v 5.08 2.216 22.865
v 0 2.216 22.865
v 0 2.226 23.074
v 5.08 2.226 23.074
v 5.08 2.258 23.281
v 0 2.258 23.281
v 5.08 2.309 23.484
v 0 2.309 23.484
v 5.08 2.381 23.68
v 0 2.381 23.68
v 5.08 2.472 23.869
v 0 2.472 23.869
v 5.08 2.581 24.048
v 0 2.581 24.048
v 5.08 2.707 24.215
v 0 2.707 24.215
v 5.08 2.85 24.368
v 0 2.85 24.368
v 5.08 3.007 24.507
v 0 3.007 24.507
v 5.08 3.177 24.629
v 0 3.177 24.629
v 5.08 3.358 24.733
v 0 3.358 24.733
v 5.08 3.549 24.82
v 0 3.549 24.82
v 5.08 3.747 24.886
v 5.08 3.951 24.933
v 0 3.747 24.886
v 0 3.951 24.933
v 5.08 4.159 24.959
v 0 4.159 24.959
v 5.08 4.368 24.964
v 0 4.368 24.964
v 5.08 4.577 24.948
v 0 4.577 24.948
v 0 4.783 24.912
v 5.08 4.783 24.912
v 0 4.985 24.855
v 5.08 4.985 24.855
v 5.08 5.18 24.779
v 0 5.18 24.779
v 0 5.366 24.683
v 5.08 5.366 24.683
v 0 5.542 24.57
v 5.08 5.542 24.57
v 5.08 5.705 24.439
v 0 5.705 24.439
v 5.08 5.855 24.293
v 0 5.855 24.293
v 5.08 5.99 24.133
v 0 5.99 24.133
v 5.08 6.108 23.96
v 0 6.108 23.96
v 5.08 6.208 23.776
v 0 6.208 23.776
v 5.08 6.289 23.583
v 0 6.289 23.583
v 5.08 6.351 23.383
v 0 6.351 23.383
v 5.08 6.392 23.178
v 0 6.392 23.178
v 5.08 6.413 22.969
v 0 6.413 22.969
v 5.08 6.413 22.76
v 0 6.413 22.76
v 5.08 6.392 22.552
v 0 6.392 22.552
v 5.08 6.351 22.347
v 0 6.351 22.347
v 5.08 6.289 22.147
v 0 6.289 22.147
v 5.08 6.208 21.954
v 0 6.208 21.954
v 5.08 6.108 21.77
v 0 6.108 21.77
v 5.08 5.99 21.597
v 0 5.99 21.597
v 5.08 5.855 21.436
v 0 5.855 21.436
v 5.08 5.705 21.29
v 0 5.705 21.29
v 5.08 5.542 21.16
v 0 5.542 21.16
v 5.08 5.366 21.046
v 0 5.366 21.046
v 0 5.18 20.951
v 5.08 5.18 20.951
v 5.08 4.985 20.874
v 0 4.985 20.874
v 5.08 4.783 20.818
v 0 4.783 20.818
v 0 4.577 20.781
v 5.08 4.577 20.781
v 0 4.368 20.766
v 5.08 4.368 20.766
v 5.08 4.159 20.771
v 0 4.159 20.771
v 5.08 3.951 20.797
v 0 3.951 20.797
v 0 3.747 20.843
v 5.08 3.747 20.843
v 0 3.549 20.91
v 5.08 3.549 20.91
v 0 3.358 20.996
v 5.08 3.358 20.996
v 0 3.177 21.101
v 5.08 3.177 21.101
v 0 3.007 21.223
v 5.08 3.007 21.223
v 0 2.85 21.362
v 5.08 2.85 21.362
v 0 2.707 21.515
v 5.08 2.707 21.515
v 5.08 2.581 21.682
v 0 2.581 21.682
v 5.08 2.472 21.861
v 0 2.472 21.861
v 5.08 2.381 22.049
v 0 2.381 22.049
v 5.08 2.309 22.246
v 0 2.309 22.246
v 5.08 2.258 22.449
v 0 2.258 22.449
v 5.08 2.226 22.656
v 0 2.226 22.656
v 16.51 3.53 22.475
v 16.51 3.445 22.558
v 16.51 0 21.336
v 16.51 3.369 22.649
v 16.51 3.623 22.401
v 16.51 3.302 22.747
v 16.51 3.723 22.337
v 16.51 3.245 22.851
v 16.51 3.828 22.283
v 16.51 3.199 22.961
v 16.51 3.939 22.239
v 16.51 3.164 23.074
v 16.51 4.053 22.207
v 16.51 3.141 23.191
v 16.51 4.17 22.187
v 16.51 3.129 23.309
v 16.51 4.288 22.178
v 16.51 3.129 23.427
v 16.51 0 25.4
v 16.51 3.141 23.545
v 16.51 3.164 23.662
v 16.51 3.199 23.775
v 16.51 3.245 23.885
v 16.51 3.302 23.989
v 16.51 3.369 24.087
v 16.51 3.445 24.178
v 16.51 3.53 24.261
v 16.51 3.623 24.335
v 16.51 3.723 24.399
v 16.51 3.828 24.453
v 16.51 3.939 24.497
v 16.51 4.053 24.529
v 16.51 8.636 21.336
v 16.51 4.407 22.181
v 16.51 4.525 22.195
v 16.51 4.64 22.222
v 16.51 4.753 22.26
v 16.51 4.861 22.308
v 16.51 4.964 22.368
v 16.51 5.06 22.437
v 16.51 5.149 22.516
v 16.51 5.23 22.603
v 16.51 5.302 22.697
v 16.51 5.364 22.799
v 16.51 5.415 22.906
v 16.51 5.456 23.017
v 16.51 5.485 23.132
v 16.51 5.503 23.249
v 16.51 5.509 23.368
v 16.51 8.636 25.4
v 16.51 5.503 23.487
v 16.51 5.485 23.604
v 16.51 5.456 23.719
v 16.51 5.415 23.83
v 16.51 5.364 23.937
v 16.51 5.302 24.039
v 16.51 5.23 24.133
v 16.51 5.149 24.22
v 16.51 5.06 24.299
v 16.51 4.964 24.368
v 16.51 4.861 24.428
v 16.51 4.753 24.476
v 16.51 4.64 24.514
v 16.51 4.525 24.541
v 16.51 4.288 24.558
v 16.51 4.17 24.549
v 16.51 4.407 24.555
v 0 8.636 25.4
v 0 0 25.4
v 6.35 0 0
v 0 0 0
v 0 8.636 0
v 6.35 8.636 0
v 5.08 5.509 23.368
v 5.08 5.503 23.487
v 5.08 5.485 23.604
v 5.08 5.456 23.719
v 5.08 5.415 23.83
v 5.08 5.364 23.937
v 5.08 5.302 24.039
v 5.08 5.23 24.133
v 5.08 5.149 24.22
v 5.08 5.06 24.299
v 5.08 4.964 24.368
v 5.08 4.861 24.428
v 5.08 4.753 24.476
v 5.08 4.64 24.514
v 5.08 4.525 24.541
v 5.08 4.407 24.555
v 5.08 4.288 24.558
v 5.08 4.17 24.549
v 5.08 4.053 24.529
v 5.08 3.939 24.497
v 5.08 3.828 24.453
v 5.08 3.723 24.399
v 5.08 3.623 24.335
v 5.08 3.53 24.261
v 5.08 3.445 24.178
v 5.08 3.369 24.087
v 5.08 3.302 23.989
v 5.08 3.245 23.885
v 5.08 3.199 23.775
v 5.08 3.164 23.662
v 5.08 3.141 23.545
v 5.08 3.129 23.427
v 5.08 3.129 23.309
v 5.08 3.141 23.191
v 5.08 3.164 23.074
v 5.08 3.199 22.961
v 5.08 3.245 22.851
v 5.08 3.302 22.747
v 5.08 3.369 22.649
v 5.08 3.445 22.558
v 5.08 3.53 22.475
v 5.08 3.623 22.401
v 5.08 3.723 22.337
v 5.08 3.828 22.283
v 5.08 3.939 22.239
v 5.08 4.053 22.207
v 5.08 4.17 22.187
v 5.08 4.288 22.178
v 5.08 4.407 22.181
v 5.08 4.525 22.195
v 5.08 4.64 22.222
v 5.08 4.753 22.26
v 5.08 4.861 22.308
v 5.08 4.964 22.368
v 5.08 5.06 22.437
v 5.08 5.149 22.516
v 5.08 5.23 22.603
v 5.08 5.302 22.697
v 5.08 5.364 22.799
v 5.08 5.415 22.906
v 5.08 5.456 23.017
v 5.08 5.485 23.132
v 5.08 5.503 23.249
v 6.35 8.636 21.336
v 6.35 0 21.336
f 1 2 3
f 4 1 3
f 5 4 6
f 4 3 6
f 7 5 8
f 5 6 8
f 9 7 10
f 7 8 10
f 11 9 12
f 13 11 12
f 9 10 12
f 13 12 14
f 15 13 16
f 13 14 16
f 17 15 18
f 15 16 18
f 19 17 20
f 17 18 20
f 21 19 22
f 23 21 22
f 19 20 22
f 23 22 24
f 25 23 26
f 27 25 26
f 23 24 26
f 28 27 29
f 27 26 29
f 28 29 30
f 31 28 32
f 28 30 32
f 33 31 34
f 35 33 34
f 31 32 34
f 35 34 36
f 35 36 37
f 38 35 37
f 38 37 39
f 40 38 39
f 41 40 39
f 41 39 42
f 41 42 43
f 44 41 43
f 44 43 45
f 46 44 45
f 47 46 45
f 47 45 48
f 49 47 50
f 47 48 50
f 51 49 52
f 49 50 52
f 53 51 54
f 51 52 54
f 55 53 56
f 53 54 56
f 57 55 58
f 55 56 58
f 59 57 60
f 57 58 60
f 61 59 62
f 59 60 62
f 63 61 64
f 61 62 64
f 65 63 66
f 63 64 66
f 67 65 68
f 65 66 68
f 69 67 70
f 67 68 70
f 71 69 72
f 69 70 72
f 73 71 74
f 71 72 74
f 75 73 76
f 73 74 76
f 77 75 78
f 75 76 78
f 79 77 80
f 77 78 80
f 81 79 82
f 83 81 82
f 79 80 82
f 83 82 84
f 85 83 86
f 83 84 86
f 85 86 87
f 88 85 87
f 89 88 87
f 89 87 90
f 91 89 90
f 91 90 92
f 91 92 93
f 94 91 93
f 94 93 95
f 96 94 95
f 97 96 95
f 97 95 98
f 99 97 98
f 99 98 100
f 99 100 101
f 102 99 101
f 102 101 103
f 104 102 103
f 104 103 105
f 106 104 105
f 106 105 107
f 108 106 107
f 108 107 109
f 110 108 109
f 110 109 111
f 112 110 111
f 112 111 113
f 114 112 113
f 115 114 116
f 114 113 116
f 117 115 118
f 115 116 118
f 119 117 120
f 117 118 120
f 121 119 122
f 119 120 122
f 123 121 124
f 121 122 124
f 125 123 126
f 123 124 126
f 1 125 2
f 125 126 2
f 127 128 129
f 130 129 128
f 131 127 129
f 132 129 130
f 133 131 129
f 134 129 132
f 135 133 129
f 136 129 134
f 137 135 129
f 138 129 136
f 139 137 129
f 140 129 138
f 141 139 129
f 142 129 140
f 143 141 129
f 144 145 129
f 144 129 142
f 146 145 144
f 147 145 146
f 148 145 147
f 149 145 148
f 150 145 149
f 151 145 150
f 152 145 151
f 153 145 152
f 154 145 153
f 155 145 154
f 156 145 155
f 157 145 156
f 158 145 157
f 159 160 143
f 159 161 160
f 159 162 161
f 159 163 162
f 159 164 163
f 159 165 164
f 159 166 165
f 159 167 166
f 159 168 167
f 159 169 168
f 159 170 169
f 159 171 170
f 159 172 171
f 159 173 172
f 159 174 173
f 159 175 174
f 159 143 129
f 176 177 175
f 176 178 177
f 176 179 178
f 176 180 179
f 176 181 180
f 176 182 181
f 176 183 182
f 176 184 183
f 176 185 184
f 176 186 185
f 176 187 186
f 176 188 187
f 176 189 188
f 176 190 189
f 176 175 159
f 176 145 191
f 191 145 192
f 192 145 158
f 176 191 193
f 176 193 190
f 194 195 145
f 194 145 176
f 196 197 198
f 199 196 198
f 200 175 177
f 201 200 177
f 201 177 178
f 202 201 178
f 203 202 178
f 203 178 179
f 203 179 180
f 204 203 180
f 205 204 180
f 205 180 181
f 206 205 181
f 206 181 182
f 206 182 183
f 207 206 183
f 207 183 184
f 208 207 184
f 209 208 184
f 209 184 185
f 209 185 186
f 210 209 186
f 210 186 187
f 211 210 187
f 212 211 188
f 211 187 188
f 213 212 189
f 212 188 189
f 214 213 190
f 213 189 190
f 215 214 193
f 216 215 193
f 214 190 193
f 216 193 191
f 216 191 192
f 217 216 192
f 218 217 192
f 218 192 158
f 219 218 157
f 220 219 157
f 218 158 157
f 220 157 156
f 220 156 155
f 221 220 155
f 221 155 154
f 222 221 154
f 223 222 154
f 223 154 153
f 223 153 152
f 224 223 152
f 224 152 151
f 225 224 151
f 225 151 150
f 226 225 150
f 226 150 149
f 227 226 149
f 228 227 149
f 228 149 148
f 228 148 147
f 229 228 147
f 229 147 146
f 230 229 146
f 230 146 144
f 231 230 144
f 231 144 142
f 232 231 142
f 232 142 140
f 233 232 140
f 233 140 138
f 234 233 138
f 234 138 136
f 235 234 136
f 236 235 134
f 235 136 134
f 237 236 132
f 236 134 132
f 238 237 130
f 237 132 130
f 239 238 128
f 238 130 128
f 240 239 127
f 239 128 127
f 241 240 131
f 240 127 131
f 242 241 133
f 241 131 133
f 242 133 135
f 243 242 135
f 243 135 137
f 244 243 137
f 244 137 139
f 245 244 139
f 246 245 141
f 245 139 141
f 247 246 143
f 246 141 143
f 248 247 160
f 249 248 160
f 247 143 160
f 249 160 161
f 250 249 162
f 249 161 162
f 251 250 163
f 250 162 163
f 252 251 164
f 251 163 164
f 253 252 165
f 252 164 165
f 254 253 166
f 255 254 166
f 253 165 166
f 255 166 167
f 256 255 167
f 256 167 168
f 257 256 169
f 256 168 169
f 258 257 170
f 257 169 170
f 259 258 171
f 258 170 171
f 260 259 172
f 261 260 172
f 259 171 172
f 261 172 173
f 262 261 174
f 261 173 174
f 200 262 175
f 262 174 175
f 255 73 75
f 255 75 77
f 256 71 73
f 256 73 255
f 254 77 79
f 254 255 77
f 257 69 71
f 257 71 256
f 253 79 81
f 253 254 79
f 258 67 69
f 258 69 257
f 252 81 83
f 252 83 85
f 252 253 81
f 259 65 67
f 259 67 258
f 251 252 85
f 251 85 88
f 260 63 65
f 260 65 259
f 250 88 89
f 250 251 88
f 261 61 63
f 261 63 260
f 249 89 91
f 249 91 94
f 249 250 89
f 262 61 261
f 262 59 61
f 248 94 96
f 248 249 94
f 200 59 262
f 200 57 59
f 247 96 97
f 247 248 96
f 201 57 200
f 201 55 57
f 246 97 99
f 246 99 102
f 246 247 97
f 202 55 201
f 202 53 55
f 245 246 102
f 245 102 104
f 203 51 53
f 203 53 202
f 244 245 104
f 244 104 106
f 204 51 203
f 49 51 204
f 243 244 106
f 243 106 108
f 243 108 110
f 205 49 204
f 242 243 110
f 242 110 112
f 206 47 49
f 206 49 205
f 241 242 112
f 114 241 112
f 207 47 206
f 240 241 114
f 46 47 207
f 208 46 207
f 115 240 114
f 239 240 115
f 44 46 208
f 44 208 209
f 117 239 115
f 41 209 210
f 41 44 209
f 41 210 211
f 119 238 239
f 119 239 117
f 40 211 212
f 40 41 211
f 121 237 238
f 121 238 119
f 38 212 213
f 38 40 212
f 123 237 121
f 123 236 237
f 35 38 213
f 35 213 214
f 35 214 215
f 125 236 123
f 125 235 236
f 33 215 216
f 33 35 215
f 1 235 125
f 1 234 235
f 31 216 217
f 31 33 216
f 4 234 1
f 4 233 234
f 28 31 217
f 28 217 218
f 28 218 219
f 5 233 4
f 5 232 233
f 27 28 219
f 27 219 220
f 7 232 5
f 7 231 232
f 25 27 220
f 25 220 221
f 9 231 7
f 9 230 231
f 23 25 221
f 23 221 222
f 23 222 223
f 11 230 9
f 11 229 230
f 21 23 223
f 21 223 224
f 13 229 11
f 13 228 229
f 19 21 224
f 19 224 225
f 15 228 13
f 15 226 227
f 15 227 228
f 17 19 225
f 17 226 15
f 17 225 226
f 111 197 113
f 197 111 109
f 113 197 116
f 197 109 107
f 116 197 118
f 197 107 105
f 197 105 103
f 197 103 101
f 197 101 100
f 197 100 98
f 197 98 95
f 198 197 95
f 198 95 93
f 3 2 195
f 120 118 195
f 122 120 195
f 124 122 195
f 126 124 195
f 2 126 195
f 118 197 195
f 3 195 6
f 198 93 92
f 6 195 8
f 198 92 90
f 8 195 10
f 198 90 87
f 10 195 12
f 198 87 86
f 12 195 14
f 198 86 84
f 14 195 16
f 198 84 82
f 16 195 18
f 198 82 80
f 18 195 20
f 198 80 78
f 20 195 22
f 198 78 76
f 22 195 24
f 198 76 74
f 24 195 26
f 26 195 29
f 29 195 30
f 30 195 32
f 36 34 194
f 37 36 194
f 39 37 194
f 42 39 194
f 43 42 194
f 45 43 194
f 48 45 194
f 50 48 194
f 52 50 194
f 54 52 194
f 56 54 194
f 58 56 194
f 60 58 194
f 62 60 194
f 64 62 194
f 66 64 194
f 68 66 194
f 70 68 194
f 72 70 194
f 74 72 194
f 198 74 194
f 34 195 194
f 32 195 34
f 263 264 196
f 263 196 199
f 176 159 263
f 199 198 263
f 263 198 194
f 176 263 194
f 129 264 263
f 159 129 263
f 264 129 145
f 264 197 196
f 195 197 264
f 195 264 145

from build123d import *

# Parameters (mm, degrees)
F0_W     = 8.636
F0_H     = 25.4
F1_DEPTH = 6.35
F2_W     = 8.636
F2_H     = 4.064
F3_DEPTH = 10.16
F4_R     = 1.190625
F5_DEPTH = 16.511
F7_R     = 2.099945
F8_DEPTH = 5.08


with BuildPart() as f1:
    # F0 (on Right) → F1 (new body)
    with BuildSketch(Plane.YZ):
        with Locations((4.318, 12.7)):
            Rectangle(F0_W, F0_H)
    extrude(amount=F1_DEPTH)

    # F2 (on face) → F3 (join)
    with BuildSketch(Plane.YZ.offset(6.35)):
        with Locations((4.318, 23.368)):
            Rectangle(F2_W, F2_H)
    extrude(amount=F3_DEPTH)

    # F4 (on face) → F5 (cut, through all)
    with BuildSketch(Plane.YZ.offset(16.51)):
        with Locations((4.318, 23.368)):
            Circle(F4_R)
    extrude(amount=-F5_DEPTH, mode=Mode.SUBTRACT)

    # F7 (on face) → F8 (cut)
    with BuildSketch(Plane(origin=(0, 0, 0), x_dir=(0, -1, 0), z_dir=(-1, 0, 0))):
        with Locations((-4.315846, 22.864808)):
            Circle(F7_R)
    extrude(amount=-F8_DEPTH, mode=Mode.SUBTRACT)


solid = f1.part
